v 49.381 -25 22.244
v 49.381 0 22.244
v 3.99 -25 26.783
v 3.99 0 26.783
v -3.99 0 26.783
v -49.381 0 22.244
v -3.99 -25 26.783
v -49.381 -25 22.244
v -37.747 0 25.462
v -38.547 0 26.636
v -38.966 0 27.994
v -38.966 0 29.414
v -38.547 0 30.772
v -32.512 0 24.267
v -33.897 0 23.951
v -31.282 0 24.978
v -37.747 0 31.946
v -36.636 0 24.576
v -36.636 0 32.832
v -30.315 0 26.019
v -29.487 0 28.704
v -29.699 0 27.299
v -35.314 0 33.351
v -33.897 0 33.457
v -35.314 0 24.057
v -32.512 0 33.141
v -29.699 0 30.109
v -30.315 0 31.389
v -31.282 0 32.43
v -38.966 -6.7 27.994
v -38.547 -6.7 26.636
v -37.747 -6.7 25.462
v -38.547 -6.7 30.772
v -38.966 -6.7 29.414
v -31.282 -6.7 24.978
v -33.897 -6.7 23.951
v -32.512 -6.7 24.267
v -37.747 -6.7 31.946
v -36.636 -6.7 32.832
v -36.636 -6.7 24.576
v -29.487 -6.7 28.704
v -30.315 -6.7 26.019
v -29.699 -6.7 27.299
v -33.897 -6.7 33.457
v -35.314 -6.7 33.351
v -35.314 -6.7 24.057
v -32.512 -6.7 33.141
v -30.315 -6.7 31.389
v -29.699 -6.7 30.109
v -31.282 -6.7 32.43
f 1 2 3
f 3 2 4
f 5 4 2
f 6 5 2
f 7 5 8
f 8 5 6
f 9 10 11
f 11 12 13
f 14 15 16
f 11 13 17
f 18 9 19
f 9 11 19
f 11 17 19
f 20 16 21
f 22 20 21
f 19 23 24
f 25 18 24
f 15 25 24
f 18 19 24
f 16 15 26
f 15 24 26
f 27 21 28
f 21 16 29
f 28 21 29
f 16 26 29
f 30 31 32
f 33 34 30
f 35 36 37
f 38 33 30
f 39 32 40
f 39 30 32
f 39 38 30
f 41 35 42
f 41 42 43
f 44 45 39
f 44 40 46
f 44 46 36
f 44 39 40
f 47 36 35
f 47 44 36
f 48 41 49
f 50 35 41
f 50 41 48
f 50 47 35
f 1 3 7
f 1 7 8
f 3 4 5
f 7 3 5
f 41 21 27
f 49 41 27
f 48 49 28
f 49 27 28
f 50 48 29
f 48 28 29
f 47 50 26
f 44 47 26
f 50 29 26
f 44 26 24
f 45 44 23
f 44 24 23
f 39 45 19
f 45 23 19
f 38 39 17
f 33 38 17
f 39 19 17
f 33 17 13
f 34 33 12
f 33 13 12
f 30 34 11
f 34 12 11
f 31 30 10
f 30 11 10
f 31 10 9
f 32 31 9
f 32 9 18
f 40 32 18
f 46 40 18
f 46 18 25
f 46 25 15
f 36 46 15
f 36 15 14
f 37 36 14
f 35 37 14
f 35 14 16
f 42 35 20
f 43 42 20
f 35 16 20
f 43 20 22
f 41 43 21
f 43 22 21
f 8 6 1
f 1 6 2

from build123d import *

# Parameters (mm, degrees)
F1_DEPTH = 25
F2_R     = 40.099751
F3_R     = 4.766112
F4_DEPTH = 6.7


with BuildPart() as f1:
    # F0 (on Front) → F1 (new body)
    with BuildSketch(Plane.XZ):
        Polygon((-0.618591, 27.120201), (-0.618591, 22.243919), (0.618591, 22.243919), (0.618591, 27.120201), (0, 27.18206), align=None)
        Polygon((0.618591, 27.120201), (0.618591, 22.243919), (49.381409, 22.243919), align=None)
        Polygon((-0.618591, 27.120201), (-49.381409, 22.243919), (-0.618591, 22.243919), align=None)
    extrude(amount=F1_DEPTH)

    # F2
    f2_edges = [f1.edges().sort_by_distance(p)[0] for p in [
        (0, -12.5, 27.18206),
    ]]
    fillet(f2_edges, radius=F2_R)


with BuildPart() as f4:
    # F3 (on Front) → F4 (new body)
    with BuildSketch(Plane.XZ):
        with Locations((-34.253359, 28.704027)):
            Circle(F3_R)
    extrude(amount=F4_DEPTH)


solid = Compound([f1.part, f4.part])
